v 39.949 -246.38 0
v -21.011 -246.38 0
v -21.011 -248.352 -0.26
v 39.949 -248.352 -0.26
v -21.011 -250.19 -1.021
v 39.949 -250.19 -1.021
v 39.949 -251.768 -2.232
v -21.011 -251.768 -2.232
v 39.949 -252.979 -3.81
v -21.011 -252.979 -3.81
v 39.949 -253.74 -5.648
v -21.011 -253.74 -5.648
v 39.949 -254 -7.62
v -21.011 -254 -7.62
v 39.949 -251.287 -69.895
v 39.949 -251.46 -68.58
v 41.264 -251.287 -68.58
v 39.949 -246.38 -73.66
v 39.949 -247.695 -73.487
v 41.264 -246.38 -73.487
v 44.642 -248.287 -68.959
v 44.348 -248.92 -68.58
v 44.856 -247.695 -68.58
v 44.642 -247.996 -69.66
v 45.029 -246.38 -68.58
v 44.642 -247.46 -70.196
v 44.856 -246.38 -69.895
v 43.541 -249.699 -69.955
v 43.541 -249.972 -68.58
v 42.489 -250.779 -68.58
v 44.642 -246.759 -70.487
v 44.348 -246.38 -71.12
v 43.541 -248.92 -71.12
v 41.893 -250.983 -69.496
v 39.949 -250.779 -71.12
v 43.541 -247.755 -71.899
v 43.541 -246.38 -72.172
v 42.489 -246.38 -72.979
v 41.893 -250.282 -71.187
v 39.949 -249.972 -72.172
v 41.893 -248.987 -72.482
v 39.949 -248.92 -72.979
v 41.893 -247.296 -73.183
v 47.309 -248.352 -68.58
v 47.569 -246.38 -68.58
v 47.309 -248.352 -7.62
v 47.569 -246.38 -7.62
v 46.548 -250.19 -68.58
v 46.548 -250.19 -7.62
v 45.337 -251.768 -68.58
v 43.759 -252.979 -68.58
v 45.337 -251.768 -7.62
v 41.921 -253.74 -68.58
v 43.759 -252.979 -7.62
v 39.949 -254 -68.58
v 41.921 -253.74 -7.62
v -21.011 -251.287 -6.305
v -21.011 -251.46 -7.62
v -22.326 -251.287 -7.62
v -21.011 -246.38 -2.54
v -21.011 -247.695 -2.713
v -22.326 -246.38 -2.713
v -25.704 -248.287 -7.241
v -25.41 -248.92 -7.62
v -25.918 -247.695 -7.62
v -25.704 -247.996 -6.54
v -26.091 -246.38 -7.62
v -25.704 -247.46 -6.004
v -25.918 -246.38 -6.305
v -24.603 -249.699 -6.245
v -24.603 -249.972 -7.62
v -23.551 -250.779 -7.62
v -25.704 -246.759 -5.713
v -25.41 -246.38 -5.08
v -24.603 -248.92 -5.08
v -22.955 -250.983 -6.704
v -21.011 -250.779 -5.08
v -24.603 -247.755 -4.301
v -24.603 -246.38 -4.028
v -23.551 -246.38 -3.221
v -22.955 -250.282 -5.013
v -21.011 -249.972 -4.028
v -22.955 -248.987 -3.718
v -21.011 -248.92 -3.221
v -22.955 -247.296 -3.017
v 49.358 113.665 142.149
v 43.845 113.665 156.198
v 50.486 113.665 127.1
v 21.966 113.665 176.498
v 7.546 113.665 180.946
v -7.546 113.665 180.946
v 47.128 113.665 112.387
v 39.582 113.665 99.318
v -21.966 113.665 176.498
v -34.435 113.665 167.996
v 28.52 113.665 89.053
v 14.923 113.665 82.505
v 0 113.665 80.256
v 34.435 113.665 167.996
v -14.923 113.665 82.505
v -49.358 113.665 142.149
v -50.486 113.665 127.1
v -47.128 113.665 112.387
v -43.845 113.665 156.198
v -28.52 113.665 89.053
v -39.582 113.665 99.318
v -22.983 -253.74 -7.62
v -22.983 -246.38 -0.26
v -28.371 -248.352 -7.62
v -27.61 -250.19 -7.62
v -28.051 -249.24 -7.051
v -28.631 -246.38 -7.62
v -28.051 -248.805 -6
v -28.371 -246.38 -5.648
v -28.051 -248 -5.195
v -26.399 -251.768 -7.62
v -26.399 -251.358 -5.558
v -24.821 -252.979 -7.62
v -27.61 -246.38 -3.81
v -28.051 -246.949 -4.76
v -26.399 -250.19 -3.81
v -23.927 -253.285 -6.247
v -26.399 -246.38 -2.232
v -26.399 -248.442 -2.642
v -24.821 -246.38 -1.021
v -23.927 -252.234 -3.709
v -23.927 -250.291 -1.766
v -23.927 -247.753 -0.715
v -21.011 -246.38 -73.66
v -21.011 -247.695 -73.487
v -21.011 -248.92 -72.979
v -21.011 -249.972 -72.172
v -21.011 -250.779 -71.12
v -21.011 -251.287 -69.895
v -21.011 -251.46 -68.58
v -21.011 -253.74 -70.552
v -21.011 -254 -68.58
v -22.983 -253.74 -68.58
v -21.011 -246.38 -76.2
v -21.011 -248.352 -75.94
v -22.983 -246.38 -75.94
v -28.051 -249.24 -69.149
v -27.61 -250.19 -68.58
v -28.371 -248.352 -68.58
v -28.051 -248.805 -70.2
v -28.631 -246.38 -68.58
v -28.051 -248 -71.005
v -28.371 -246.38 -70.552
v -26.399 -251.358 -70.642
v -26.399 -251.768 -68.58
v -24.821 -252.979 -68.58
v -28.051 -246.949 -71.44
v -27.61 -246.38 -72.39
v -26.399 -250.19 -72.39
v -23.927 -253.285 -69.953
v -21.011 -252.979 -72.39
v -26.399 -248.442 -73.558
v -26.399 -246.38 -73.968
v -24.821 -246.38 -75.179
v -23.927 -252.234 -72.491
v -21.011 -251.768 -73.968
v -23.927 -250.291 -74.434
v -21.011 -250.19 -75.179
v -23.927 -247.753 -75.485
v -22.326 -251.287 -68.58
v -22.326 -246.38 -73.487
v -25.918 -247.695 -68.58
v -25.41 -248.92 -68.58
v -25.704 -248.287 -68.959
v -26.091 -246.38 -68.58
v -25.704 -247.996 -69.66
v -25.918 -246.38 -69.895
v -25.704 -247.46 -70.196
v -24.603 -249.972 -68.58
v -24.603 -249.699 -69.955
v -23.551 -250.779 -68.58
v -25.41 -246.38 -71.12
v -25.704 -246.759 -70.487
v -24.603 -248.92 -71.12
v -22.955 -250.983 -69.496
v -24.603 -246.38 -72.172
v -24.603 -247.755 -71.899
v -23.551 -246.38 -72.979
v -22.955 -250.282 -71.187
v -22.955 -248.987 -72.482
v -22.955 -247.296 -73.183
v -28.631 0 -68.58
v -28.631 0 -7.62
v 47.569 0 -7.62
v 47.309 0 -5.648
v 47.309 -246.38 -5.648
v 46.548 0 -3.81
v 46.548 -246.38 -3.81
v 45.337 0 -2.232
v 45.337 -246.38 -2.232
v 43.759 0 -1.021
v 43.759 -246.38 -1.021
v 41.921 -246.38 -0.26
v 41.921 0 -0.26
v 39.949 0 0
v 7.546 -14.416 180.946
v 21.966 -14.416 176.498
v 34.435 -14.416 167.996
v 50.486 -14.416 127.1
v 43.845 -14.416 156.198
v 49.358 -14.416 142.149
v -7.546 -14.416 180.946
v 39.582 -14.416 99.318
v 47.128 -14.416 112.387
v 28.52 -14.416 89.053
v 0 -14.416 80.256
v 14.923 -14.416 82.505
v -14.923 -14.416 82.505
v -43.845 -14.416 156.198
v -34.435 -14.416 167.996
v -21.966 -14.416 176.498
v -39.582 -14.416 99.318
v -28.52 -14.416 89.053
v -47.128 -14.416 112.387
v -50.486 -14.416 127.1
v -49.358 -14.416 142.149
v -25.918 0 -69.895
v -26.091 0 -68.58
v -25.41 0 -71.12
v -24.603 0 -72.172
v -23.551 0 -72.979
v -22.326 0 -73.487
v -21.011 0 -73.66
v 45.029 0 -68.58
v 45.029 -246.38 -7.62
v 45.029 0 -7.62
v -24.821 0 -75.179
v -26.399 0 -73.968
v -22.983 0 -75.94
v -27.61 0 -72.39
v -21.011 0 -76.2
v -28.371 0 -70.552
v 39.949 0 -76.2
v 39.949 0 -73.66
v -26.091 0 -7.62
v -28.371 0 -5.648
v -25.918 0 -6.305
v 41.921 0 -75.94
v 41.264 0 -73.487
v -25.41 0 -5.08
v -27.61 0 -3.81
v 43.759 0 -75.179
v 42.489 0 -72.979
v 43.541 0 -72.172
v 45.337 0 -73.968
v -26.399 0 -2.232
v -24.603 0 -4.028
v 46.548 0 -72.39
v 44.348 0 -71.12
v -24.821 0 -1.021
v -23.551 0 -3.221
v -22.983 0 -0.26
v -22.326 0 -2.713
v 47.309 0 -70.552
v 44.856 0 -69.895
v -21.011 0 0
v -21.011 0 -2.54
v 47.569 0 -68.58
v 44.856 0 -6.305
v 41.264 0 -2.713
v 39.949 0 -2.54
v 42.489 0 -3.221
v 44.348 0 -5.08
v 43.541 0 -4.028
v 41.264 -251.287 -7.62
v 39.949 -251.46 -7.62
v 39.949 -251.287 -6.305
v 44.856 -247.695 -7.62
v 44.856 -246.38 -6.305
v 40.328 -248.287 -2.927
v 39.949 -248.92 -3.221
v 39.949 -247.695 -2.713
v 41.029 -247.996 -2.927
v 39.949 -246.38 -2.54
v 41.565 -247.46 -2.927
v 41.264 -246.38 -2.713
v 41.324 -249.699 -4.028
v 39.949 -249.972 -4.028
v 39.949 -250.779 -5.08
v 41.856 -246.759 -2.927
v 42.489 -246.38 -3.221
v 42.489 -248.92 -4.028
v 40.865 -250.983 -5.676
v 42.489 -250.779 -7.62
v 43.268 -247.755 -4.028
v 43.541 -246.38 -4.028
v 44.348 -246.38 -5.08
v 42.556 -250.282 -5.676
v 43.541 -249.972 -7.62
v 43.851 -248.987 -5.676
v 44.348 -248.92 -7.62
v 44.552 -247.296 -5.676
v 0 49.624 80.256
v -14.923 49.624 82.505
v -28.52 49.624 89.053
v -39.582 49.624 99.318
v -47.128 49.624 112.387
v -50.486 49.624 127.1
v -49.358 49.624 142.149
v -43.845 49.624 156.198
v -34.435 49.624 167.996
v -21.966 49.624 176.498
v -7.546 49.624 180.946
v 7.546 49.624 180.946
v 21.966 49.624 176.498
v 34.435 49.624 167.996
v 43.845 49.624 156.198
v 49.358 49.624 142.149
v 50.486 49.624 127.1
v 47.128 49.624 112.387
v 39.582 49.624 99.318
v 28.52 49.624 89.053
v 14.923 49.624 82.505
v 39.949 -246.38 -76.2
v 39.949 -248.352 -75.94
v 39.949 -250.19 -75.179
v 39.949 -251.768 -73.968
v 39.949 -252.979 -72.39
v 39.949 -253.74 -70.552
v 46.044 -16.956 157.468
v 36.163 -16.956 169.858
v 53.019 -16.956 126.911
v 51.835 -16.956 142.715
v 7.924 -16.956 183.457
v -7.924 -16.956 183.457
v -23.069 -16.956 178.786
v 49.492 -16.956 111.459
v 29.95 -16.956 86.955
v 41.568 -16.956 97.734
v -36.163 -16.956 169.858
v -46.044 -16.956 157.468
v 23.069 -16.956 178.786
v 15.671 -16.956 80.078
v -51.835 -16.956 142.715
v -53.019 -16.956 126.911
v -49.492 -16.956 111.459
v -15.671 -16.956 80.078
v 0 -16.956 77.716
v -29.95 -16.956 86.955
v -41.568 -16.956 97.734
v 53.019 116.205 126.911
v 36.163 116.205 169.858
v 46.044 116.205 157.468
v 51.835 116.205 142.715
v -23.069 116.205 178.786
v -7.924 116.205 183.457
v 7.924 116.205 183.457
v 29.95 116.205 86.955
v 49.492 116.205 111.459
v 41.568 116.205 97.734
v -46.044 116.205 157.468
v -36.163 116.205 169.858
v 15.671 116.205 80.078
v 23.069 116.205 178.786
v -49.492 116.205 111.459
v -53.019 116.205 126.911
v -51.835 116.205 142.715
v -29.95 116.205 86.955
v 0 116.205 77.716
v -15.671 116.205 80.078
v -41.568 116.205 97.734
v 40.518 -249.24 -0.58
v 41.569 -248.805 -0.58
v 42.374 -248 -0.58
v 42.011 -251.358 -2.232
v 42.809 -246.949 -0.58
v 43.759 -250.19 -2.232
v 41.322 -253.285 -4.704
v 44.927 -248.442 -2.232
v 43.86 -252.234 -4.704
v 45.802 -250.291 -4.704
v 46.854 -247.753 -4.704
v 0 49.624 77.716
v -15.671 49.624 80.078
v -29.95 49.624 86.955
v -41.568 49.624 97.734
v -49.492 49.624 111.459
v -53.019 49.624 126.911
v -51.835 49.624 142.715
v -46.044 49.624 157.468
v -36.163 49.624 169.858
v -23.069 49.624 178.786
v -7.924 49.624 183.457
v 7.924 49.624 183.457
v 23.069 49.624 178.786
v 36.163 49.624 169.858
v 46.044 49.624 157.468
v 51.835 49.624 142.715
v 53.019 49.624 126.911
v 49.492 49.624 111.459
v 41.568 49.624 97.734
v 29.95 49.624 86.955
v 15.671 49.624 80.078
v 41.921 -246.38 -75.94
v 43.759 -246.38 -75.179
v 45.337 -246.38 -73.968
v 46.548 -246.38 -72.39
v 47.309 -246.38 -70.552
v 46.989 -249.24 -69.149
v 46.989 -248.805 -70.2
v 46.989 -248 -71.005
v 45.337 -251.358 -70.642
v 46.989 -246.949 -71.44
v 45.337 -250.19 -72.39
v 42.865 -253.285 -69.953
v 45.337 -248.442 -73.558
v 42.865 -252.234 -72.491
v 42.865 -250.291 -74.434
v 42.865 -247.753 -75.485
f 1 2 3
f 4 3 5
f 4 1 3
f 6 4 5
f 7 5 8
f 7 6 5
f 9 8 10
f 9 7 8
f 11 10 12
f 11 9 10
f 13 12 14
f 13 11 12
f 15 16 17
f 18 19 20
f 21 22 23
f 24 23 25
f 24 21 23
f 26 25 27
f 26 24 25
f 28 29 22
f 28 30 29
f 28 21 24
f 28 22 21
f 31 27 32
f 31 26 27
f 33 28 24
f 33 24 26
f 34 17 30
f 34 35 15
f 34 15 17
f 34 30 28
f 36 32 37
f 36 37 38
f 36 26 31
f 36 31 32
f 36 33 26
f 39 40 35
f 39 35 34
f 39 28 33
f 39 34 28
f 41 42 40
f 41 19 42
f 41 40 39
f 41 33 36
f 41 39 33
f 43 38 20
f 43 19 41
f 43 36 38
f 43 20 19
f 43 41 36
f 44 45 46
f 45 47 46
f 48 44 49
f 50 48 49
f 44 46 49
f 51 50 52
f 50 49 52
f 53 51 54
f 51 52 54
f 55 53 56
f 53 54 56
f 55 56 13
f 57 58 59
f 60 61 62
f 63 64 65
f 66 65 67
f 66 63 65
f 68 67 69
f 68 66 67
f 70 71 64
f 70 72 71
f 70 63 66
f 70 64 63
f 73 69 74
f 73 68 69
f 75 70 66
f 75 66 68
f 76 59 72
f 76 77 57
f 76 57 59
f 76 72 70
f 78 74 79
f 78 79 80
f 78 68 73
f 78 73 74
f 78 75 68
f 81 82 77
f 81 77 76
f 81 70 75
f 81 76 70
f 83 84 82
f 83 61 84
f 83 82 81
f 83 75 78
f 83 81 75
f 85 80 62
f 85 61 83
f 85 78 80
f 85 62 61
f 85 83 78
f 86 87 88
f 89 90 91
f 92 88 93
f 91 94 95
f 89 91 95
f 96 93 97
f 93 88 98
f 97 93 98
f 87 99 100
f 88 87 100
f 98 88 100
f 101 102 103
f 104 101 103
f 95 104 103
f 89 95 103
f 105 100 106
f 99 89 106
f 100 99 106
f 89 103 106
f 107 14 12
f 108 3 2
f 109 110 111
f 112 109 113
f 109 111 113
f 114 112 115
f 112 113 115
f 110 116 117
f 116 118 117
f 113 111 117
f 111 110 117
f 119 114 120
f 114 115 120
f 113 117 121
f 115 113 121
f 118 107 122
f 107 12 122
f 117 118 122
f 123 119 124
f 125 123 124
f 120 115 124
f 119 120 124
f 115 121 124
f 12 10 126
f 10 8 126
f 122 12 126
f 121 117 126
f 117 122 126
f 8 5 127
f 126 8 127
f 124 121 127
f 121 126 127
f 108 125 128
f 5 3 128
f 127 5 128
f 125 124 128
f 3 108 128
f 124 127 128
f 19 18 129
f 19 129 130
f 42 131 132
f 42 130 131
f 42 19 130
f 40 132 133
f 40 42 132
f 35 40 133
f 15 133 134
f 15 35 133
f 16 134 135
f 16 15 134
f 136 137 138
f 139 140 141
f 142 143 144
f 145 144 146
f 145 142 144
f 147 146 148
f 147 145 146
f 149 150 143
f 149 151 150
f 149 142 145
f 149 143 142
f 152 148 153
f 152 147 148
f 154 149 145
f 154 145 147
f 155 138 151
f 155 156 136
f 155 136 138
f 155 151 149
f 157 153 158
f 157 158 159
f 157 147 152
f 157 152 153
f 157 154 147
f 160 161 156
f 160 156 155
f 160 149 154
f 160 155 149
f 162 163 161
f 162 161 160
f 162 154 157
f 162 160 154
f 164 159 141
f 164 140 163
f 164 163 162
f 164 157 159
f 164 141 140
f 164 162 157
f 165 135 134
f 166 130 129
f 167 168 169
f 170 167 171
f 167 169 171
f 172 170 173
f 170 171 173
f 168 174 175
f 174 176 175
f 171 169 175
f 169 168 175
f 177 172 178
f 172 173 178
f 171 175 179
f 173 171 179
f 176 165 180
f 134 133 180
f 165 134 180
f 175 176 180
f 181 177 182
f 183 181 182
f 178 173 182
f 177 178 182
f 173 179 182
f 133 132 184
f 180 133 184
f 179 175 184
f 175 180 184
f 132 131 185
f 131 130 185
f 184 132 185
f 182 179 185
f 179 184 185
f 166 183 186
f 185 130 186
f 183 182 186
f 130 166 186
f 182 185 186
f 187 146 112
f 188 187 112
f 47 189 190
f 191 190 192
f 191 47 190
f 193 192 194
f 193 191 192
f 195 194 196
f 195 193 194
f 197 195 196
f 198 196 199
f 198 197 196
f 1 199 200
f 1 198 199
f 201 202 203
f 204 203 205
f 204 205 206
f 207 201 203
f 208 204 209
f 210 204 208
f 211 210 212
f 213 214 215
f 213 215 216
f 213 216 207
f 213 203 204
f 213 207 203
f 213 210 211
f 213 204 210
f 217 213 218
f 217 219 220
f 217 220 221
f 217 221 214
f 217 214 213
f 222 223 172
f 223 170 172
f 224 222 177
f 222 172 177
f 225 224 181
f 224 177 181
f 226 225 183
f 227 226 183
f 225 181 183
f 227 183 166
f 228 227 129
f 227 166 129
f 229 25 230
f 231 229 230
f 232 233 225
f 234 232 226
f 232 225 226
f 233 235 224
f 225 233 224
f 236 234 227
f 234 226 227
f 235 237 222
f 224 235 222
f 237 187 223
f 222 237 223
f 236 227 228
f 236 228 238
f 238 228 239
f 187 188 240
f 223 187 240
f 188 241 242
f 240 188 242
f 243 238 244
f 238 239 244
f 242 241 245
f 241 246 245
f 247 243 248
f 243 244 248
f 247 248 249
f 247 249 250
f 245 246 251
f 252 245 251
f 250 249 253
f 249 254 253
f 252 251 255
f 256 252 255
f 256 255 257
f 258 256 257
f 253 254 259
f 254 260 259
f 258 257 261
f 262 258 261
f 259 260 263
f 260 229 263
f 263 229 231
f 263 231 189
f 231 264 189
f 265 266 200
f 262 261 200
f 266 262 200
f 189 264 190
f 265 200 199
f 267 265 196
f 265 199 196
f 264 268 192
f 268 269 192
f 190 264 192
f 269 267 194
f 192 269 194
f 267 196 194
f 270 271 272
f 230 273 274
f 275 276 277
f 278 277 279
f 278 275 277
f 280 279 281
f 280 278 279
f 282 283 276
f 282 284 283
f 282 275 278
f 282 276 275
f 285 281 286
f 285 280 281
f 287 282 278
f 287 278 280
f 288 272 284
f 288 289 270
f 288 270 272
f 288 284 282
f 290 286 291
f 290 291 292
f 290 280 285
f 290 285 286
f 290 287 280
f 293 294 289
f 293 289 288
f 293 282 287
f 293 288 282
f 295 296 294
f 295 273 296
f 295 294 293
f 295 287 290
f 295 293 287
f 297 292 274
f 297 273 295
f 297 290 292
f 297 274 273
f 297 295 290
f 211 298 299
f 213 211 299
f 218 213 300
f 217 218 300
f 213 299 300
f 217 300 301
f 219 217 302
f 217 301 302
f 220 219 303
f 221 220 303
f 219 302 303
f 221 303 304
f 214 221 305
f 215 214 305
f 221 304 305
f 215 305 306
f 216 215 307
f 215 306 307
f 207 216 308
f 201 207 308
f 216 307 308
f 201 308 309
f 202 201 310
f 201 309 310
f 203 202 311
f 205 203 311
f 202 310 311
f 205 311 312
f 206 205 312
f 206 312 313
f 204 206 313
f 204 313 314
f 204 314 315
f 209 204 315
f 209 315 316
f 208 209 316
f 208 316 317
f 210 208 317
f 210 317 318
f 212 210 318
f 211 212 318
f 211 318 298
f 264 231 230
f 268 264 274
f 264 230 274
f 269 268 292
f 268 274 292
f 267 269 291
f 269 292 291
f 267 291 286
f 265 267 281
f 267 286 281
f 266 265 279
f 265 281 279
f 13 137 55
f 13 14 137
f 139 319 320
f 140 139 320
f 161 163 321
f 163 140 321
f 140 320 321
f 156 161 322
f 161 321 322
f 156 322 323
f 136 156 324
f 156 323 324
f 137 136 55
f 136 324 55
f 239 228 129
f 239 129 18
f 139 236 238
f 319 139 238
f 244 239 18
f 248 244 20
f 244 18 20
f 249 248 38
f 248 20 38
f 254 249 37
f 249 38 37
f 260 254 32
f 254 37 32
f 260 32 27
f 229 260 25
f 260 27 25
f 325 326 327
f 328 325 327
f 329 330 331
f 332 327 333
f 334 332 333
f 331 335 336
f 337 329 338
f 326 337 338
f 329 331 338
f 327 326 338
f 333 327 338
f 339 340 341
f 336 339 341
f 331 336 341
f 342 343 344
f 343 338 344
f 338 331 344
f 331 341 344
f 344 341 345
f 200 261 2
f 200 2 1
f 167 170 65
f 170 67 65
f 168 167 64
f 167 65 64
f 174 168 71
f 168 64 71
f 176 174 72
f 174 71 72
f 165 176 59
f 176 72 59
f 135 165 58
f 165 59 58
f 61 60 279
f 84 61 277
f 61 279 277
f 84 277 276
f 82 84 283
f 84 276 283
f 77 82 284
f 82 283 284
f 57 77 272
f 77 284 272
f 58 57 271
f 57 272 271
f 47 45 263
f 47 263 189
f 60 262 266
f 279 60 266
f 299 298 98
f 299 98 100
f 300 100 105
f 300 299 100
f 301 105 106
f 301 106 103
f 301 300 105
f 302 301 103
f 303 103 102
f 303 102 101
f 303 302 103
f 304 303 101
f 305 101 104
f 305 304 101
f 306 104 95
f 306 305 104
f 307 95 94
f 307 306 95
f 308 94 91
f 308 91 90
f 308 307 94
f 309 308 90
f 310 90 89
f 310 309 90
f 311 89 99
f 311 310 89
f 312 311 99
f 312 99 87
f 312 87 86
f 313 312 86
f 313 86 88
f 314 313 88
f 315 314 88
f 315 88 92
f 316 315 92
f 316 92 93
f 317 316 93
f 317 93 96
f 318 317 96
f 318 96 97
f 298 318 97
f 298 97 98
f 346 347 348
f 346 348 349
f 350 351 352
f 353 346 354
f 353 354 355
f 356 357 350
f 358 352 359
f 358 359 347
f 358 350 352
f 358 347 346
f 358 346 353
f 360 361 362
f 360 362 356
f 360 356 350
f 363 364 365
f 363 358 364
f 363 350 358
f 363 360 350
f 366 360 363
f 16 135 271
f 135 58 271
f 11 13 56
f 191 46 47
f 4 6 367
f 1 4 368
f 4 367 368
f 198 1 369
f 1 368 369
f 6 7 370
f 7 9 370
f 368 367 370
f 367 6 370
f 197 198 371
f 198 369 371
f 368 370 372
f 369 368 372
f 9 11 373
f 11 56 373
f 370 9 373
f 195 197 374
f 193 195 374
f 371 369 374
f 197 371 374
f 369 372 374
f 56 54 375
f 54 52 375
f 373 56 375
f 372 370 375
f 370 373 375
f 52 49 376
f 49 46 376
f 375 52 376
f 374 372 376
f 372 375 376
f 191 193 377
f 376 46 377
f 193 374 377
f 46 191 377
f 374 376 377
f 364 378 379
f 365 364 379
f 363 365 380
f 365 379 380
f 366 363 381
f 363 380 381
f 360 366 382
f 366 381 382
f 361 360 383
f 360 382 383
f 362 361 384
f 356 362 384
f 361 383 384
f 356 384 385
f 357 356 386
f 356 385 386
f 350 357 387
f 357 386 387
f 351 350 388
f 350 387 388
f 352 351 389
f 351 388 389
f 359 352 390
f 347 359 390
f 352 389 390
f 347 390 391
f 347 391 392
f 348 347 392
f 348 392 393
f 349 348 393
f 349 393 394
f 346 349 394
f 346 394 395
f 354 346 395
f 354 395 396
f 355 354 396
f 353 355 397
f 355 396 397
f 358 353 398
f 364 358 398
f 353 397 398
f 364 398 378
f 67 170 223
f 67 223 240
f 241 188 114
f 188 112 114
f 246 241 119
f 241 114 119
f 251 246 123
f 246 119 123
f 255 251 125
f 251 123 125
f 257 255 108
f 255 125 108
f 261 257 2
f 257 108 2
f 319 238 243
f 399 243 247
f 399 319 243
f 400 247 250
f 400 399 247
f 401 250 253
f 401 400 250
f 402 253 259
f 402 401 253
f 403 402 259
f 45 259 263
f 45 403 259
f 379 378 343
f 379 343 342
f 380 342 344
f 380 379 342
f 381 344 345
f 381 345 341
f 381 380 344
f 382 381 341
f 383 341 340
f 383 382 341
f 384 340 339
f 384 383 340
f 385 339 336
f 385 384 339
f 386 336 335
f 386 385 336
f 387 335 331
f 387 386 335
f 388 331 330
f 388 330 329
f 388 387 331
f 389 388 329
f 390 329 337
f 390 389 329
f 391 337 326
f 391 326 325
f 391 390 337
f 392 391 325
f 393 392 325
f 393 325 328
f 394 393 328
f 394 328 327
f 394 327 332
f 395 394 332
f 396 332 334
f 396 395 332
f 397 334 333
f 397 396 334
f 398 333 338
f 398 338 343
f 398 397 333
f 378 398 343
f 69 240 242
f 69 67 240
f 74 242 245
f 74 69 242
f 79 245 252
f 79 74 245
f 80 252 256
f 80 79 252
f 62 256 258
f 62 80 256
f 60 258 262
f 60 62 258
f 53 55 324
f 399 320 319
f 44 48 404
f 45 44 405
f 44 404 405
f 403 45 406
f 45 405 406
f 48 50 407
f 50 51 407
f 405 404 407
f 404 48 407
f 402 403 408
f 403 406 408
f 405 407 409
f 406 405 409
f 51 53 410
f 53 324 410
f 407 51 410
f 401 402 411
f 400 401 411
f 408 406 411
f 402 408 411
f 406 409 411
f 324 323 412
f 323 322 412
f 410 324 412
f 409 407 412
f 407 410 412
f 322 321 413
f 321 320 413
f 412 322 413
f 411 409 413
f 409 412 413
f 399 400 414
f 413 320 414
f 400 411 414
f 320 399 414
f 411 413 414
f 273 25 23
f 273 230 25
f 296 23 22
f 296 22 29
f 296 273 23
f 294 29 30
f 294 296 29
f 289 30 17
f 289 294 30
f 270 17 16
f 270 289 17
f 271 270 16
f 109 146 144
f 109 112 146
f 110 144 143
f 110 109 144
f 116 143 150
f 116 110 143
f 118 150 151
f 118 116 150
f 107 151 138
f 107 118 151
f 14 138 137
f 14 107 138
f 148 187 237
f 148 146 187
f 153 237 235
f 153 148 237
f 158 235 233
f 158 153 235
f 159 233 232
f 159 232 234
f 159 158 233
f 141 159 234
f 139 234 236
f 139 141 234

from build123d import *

# Parameters (mm, degrees)
F0_W     = 76.2
F0_H     = 76.2
F1_DEPTH = 254
F2_R     = 7.62
F3_T     = -2.54
F4_W     = 66.5805451572
F4_H     = 53.1675685197
F6_T     = -2.54


with BuildPart() as f1:
    # F0 (on Front) → F1 (new body)
    with BuildSketch(Plane.XZ):
        with Locations((9.4689666241, -38.1)):
            Rectangle(F0_W, F0_H)
    extrude(amount=F1_DEPTH)

    # F2
    f2_edges = [f1.edges().sort_by_distance(p)[0] for p in [
        (9.468967, -254, -76.2),
        (47.568967, -254, -38.1),
        (9.468967, -254, 0),
        (-28.631033, -254, -38.1),
        (-28.631033, -127, -76.2),
        (-28.631033, -127, 0),
        (47.568967, -127, -76.2),
        (47.568967, -127, 0),
    ]]
    fillet(f2_edges, radius=F2_R)

    # F3
    f3_openings = [f1.faces().sort_by_distance(p)[0] for p in [
        (9.468967, 0, -38.1),
    ]]
    offset(amount=F3_T, openings=f3_openings)


with BuildPart() as f5:
    # F4 (on Right) → F5 (revolve)
    with BuildSketch(Plane.YZ):
        with Locations((16.3341406733, 104.2999727651)):
            Rectangle(F4_W, F4_H)
    revolve(axis=Axis((0, 16.3341406733, 130.883757025), (0, 1, 0)))

    # F6
    f6_openings = [f5.faces().sort_by_distance(p)[0] for p in [
        (0, 49.624413, 130.883757),
    ]]
    offset(amount=F6_T, openings=f6_openings)

    # F7: F5 across face


with BuildPart() as f5_1:
    add(f5.part)
    add(f5.part.mirror(Plane(origin=(0, 49.6244132519, 130.883757025), x_dir=(-1, 0, 0), z_dir=(0, 1, 0))))


solid = Compound([f1.part, f5_1.part])
